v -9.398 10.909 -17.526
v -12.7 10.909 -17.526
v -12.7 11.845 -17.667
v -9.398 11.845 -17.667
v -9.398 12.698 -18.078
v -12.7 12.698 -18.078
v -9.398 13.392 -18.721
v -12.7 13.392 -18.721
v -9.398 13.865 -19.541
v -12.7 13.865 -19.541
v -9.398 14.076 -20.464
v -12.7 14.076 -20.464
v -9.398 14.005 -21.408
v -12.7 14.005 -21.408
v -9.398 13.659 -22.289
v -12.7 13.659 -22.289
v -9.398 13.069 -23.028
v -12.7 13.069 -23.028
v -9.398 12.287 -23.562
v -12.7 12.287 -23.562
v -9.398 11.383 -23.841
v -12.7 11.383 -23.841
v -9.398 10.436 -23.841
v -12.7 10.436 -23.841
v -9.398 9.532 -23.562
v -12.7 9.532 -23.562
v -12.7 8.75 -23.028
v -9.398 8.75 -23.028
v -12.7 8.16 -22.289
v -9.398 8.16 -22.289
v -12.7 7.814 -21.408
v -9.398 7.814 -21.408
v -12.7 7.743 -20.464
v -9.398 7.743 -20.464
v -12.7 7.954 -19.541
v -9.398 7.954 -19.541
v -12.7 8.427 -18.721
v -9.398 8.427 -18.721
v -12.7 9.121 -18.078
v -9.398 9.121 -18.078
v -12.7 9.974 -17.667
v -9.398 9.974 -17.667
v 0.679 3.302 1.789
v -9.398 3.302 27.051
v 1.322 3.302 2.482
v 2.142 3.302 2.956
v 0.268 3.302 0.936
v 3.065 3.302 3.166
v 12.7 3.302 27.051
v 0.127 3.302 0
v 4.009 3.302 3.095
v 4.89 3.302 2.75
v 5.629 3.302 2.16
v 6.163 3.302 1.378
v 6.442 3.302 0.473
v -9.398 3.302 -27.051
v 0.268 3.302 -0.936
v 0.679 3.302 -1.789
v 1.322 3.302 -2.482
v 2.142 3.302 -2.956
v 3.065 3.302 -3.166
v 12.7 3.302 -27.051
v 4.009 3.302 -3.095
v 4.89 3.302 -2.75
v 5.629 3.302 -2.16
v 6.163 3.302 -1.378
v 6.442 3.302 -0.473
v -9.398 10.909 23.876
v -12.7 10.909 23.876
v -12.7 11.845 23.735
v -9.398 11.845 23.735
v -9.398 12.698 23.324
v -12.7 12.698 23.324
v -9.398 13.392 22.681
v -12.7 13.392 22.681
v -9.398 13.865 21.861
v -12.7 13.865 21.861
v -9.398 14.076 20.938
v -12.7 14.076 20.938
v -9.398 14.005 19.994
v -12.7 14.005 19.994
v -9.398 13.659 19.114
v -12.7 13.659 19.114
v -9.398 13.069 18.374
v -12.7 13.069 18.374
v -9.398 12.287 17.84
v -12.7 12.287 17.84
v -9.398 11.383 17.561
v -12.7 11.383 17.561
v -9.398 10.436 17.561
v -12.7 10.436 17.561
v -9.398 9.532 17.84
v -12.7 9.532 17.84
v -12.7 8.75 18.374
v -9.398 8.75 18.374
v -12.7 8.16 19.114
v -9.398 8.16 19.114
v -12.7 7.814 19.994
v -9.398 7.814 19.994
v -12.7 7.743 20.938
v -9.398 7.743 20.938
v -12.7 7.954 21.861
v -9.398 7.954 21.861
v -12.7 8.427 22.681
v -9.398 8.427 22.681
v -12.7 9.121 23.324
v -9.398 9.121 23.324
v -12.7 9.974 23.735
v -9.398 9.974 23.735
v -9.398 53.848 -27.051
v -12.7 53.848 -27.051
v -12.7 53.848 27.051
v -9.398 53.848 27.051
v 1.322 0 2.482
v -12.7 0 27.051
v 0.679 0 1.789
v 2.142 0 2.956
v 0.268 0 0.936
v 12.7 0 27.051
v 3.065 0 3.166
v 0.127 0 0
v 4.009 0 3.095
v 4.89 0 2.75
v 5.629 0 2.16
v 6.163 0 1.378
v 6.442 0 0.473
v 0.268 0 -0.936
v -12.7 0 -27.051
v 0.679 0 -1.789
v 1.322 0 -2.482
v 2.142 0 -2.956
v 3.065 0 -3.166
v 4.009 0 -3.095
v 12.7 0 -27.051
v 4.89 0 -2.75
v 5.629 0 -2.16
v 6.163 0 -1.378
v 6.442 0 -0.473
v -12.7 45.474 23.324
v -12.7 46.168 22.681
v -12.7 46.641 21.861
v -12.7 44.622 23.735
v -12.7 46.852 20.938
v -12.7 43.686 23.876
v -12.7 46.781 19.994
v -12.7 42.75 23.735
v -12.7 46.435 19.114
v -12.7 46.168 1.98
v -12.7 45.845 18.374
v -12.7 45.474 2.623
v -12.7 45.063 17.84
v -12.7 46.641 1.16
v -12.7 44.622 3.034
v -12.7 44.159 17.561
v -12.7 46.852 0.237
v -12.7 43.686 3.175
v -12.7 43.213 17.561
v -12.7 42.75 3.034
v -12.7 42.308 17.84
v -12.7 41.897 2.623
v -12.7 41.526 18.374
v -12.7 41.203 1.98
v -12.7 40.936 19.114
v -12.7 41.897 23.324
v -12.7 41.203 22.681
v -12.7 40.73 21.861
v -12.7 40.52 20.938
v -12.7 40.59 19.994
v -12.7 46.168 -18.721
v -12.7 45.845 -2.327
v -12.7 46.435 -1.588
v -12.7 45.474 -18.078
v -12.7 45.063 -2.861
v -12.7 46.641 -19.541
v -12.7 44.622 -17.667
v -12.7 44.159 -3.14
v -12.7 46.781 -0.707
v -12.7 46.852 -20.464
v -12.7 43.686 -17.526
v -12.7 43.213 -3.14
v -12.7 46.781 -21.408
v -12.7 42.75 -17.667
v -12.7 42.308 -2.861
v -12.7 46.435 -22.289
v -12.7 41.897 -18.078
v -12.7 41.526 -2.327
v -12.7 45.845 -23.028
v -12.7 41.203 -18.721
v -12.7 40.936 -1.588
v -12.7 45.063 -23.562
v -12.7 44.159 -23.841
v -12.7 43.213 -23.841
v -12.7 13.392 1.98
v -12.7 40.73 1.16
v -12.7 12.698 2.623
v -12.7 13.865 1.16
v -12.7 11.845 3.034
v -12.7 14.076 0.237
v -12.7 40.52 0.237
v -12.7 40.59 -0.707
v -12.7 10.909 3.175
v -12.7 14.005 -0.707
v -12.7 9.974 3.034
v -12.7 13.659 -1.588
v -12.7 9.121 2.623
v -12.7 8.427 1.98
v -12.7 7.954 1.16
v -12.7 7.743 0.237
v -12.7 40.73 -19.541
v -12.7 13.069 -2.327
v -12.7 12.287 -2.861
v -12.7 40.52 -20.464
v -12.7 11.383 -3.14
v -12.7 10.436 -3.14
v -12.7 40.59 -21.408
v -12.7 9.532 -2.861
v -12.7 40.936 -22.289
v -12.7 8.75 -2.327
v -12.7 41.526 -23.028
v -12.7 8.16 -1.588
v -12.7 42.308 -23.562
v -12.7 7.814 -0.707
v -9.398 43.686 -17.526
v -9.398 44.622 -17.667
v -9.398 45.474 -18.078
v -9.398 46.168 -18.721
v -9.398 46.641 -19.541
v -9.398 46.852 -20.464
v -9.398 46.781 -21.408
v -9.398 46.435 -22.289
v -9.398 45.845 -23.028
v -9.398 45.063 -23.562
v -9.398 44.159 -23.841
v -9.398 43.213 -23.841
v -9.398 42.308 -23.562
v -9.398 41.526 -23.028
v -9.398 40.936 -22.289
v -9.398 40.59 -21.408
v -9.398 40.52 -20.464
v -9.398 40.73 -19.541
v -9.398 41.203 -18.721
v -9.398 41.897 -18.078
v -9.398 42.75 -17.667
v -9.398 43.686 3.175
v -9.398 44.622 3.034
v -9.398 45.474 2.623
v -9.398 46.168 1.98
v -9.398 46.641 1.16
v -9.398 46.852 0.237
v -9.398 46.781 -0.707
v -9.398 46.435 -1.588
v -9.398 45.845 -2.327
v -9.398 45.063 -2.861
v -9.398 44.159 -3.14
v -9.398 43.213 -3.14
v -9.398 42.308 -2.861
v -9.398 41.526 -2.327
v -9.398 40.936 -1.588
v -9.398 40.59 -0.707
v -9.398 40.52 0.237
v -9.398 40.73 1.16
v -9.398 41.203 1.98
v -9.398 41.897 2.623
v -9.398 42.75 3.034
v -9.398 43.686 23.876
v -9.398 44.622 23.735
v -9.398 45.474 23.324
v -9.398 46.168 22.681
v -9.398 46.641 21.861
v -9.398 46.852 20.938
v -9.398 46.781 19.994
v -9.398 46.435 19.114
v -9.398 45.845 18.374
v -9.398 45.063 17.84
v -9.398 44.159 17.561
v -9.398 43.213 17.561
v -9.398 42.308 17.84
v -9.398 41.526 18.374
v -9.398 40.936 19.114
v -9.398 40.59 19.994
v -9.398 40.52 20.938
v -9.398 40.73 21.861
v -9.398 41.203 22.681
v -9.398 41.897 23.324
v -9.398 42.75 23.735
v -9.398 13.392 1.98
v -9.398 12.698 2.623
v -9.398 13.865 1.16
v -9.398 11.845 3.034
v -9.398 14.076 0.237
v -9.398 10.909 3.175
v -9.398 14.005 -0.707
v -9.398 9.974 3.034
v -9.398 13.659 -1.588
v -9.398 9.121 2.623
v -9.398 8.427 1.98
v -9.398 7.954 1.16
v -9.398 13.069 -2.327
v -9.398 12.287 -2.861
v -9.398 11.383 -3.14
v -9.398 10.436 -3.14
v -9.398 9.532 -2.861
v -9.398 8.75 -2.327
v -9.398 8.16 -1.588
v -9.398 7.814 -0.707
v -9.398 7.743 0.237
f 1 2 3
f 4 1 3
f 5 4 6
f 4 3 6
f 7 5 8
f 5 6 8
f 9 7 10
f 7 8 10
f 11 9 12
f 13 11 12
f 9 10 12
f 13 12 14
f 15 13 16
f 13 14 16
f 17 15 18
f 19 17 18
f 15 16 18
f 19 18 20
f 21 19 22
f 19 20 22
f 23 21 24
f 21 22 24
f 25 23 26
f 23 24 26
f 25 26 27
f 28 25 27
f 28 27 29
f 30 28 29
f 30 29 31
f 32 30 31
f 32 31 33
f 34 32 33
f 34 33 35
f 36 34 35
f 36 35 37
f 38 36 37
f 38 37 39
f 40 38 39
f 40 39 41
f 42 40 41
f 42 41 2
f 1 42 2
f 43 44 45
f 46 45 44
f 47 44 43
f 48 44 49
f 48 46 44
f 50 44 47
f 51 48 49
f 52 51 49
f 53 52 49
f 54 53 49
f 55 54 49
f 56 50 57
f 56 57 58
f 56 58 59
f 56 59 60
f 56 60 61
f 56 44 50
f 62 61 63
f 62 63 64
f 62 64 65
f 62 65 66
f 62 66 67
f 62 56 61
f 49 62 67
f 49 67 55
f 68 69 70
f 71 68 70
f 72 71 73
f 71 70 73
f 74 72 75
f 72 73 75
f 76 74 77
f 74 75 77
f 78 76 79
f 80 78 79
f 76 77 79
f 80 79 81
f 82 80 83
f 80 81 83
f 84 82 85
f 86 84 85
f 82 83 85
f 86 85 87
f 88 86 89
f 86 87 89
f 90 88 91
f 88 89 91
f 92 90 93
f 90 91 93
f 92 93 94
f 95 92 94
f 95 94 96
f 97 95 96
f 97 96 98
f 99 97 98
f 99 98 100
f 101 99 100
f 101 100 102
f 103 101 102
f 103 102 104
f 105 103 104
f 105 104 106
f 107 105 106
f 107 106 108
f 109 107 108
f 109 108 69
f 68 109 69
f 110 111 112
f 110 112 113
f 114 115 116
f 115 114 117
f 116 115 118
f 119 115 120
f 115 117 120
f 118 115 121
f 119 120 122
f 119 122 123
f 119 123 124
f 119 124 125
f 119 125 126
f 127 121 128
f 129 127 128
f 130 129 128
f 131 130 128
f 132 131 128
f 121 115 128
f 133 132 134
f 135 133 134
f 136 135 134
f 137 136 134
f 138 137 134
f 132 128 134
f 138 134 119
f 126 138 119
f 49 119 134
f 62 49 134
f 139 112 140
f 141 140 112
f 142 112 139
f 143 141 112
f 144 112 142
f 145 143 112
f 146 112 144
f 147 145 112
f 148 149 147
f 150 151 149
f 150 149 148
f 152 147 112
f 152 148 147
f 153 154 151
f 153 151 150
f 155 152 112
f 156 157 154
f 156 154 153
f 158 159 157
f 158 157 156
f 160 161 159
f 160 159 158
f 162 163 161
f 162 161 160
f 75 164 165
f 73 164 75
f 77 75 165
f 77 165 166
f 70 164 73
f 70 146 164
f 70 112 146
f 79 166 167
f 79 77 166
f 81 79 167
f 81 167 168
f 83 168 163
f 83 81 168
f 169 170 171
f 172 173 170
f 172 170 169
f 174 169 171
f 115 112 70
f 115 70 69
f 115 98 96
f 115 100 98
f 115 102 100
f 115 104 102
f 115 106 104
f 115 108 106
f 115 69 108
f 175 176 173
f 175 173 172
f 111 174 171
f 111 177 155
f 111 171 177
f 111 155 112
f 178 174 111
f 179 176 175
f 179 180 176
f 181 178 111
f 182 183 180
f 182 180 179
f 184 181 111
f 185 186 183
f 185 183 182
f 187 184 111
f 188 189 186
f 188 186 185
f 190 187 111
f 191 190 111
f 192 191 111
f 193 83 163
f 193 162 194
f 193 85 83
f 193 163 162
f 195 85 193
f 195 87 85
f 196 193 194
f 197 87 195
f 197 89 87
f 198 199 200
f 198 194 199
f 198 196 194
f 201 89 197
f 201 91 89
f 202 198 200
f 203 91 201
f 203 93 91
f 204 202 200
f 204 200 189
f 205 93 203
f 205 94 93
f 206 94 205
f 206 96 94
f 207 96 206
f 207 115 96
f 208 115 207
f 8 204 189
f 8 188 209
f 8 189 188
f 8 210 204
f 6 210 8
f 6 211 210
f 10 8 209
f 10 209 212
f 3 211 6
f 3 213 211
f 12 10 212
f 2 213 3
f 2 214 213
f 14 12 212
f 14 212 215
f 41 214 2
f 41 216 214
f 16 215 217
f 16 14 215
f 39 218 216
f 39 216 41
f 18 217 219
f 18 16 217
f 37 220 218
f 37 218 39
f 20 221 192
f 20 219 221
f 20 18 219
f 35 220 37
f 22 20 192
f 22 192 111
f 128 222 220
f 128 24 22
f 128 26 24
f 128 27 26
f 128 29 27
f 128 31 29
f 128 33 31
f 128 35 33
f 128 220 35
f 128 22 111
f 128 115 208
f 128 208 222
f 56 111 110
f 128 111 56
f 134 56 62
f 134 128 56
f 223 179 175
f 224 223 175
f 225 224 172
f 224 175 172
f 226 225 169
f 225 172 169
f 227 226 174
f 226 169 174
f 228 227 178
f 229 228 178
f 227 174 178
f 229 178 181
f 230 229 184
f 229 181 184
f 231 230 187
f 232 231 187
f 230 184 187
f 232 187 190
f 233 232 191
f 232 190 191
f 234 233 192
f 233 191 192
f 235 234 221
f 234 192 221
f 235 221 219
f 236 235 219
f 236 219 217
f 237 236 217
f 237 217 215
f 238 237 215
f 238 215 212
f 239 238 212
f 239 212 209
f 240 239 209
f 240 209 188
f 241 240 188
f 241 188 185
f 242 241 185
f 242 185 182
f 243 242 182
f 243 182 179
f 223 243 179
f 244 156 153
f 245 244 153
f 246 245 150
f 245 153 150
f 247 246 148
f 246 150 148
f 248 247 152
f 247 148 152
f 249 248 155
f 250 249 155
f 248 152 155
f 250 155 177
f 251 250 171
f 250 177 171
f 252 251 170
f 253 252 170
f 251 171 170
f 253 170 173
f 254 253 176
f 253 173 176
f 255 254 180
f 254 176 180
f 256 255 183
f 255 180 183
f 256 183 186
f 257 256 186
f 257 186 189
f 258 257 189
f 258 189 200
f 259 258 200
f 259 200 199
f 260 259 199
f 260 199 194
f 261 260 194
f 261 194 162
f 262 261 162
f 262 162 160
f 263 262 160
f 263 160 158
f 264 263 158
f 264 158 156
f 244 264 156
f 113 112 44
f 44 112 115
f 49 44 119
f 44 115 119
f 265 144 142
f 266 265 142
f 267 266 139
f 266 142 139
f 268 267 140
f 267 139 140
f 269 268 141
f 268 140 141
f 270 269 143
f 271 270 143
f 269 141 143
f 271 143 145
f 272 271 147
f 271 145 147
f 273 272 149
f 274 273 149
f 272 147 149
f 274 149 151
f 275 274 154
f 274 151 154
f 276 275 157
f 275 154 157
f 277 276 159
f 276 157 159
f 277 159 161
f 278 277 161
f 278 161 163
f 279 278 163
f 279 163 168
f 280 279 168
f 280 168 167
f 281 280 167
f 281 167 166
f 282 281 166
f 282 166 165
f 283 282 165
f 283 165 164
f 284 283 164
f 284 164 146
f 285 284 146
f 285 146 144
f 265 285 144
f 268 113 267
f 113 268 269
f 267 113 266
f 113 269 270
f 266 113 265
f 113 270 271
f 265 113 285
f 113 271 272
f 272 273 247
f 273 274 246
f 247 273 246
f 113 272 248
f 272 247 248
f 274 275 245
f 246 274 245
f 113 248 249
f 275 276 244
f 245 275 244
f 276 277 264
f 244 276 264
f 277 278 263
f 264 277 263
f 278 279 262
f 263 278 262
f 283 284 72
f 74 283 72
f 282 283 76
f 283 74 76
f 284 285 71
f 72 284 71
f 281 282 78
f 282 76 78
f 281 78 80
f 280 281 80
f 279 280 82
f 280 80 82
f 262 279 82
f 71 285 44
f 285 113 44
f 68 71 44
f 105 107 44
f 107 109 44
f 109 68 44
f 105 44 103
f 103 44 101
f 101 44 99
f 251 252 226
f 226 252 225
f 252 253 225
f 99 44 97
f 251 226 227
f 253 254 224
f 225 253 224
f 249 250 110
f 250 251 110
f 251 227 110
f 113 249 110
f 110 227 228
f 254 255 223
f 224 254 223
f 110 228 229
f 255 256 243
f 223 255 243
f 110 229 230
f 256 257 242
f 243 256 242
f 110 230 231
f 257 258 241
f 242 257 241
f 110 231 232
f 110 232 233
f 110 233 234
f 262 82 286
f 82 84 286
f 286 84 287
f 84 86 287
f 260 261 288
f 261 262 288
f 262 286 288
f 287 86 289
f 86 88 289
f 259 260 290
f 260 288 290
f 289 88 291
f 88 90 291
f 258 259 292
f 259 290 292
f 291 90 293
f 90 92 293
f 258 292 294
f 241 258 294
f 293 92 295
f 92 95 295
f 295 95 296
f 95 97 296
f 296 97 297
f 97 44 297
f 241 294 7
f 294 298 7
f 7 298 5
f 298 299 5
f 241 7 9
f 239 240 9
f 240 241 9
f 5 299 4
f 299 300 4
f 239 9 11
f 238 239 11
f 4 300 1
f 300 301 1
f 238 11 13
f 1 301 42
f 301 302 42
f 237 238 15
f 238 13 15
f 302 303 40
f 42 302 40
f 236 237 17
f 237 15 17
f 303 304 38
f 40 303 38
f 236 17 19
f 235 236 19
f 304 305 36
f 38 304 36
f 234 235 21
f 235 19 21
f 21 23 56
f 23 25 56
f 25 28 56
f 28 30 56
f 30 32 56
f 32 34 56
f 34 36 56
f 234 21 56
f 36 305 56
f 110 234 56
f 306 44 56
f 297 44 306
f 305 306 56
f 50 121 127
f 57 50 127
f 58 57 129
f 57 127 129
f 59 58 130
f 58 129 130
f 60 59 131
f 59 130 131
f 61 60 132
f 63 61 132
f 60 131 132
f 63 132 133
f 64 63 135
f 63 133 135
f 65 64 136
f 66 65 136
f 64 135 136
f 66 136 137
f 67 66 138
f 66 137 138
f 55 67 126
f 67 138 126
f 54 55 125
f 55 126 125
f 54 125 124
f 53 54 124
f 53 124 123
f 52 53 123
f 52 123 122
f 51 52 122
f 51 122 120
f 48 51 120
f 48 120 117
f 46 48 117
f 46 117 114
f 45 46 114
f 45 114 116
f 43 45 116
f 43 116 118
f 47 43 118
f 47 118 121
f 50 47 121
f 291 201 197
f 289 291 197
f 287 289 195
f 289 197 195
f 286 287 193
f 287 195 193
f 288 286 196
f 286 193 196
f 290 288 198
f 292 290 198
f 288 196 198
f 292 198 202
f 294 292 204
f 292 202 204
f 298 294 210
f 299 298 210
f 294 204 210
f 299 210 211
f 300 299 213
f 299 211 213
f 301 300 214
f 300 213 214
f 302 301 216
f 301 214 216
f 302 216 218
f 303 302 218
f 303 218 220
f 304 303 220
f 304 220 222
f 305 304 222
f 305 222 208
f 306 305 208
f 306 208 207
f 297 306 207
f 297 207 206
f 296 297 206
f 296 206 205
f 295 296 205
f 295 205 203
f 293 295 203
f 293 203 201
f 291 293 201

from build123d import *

# Parameters (mm, degrees)
SKETCH2_W                   = 25.4
SKETCH2_H                   = 54.102
BOSS_EXTRUDE1_DEPTH         = 3.302
SKETCH3_W                   = 3.302
SKETCH3_H                   = 54.102
BOSS_EXTRUDE2_DEPTH         = 50.546
F_1_4_0_25_DIAMETER_HOLE1_D = 6.35
F_1_4_0_25_DIAMETER_HOLE3_D = 6.35


with BuildPart() as part:
    # Sketch2 → Boss-Extrude1 (new body)
    with BuildSketch(Plane(origin=(0, 0, 0), x_dir=(1, 0, 0), z_dir=(0, 1, 0))):
        Rectangle(SKETCH2_W, SKETCH2_H)
    extrude(amount=BOSS_EXTRUDE1_DEPTH)

    # Sketch3 → Boss-Extrude2 (add)
    with BuildSketch(Plane(origin=(0, 3.302, 0), x_dir=(1, 0, 0), z_dir=(0, 1, 0))):
        with Locations((-11.049, 0)):
            Rectangle(SKETCH3_W, SKETCH3_H)
    extrude(amount=BOSS_EXTRUDE2_DEPTH)

    # 1/4 (0.25) Diameter Hole1 (through all)
    with Locations(Plane(origin=(-9.398, 0, 0), x_dir=(0, 0, -1), z_dir=(1, 0, 0))):
        with Locations((-20.701, 43.685729795), (0, 43.685729795), (20.701, 43.685729795), (20.701, 10.909480531), (0, 10.909480531), (-20.701, 10.909480531)):
            Hole(F_1_4_0_25_DIAMETER_HOLE1_D / 2)

    # 1/4 (0.25) Diameter Hole3 (through all)
    with Locations(Plane(origin=(0, 3.302, 0), x_dir=(1, 0, 0), z_dir=(0, 1, 0))):
        with Locations((3.302, 0)):
            Hole(F_1_4_0_25_DIAMETER_HOLE3_D / 2)


solid = part.part
